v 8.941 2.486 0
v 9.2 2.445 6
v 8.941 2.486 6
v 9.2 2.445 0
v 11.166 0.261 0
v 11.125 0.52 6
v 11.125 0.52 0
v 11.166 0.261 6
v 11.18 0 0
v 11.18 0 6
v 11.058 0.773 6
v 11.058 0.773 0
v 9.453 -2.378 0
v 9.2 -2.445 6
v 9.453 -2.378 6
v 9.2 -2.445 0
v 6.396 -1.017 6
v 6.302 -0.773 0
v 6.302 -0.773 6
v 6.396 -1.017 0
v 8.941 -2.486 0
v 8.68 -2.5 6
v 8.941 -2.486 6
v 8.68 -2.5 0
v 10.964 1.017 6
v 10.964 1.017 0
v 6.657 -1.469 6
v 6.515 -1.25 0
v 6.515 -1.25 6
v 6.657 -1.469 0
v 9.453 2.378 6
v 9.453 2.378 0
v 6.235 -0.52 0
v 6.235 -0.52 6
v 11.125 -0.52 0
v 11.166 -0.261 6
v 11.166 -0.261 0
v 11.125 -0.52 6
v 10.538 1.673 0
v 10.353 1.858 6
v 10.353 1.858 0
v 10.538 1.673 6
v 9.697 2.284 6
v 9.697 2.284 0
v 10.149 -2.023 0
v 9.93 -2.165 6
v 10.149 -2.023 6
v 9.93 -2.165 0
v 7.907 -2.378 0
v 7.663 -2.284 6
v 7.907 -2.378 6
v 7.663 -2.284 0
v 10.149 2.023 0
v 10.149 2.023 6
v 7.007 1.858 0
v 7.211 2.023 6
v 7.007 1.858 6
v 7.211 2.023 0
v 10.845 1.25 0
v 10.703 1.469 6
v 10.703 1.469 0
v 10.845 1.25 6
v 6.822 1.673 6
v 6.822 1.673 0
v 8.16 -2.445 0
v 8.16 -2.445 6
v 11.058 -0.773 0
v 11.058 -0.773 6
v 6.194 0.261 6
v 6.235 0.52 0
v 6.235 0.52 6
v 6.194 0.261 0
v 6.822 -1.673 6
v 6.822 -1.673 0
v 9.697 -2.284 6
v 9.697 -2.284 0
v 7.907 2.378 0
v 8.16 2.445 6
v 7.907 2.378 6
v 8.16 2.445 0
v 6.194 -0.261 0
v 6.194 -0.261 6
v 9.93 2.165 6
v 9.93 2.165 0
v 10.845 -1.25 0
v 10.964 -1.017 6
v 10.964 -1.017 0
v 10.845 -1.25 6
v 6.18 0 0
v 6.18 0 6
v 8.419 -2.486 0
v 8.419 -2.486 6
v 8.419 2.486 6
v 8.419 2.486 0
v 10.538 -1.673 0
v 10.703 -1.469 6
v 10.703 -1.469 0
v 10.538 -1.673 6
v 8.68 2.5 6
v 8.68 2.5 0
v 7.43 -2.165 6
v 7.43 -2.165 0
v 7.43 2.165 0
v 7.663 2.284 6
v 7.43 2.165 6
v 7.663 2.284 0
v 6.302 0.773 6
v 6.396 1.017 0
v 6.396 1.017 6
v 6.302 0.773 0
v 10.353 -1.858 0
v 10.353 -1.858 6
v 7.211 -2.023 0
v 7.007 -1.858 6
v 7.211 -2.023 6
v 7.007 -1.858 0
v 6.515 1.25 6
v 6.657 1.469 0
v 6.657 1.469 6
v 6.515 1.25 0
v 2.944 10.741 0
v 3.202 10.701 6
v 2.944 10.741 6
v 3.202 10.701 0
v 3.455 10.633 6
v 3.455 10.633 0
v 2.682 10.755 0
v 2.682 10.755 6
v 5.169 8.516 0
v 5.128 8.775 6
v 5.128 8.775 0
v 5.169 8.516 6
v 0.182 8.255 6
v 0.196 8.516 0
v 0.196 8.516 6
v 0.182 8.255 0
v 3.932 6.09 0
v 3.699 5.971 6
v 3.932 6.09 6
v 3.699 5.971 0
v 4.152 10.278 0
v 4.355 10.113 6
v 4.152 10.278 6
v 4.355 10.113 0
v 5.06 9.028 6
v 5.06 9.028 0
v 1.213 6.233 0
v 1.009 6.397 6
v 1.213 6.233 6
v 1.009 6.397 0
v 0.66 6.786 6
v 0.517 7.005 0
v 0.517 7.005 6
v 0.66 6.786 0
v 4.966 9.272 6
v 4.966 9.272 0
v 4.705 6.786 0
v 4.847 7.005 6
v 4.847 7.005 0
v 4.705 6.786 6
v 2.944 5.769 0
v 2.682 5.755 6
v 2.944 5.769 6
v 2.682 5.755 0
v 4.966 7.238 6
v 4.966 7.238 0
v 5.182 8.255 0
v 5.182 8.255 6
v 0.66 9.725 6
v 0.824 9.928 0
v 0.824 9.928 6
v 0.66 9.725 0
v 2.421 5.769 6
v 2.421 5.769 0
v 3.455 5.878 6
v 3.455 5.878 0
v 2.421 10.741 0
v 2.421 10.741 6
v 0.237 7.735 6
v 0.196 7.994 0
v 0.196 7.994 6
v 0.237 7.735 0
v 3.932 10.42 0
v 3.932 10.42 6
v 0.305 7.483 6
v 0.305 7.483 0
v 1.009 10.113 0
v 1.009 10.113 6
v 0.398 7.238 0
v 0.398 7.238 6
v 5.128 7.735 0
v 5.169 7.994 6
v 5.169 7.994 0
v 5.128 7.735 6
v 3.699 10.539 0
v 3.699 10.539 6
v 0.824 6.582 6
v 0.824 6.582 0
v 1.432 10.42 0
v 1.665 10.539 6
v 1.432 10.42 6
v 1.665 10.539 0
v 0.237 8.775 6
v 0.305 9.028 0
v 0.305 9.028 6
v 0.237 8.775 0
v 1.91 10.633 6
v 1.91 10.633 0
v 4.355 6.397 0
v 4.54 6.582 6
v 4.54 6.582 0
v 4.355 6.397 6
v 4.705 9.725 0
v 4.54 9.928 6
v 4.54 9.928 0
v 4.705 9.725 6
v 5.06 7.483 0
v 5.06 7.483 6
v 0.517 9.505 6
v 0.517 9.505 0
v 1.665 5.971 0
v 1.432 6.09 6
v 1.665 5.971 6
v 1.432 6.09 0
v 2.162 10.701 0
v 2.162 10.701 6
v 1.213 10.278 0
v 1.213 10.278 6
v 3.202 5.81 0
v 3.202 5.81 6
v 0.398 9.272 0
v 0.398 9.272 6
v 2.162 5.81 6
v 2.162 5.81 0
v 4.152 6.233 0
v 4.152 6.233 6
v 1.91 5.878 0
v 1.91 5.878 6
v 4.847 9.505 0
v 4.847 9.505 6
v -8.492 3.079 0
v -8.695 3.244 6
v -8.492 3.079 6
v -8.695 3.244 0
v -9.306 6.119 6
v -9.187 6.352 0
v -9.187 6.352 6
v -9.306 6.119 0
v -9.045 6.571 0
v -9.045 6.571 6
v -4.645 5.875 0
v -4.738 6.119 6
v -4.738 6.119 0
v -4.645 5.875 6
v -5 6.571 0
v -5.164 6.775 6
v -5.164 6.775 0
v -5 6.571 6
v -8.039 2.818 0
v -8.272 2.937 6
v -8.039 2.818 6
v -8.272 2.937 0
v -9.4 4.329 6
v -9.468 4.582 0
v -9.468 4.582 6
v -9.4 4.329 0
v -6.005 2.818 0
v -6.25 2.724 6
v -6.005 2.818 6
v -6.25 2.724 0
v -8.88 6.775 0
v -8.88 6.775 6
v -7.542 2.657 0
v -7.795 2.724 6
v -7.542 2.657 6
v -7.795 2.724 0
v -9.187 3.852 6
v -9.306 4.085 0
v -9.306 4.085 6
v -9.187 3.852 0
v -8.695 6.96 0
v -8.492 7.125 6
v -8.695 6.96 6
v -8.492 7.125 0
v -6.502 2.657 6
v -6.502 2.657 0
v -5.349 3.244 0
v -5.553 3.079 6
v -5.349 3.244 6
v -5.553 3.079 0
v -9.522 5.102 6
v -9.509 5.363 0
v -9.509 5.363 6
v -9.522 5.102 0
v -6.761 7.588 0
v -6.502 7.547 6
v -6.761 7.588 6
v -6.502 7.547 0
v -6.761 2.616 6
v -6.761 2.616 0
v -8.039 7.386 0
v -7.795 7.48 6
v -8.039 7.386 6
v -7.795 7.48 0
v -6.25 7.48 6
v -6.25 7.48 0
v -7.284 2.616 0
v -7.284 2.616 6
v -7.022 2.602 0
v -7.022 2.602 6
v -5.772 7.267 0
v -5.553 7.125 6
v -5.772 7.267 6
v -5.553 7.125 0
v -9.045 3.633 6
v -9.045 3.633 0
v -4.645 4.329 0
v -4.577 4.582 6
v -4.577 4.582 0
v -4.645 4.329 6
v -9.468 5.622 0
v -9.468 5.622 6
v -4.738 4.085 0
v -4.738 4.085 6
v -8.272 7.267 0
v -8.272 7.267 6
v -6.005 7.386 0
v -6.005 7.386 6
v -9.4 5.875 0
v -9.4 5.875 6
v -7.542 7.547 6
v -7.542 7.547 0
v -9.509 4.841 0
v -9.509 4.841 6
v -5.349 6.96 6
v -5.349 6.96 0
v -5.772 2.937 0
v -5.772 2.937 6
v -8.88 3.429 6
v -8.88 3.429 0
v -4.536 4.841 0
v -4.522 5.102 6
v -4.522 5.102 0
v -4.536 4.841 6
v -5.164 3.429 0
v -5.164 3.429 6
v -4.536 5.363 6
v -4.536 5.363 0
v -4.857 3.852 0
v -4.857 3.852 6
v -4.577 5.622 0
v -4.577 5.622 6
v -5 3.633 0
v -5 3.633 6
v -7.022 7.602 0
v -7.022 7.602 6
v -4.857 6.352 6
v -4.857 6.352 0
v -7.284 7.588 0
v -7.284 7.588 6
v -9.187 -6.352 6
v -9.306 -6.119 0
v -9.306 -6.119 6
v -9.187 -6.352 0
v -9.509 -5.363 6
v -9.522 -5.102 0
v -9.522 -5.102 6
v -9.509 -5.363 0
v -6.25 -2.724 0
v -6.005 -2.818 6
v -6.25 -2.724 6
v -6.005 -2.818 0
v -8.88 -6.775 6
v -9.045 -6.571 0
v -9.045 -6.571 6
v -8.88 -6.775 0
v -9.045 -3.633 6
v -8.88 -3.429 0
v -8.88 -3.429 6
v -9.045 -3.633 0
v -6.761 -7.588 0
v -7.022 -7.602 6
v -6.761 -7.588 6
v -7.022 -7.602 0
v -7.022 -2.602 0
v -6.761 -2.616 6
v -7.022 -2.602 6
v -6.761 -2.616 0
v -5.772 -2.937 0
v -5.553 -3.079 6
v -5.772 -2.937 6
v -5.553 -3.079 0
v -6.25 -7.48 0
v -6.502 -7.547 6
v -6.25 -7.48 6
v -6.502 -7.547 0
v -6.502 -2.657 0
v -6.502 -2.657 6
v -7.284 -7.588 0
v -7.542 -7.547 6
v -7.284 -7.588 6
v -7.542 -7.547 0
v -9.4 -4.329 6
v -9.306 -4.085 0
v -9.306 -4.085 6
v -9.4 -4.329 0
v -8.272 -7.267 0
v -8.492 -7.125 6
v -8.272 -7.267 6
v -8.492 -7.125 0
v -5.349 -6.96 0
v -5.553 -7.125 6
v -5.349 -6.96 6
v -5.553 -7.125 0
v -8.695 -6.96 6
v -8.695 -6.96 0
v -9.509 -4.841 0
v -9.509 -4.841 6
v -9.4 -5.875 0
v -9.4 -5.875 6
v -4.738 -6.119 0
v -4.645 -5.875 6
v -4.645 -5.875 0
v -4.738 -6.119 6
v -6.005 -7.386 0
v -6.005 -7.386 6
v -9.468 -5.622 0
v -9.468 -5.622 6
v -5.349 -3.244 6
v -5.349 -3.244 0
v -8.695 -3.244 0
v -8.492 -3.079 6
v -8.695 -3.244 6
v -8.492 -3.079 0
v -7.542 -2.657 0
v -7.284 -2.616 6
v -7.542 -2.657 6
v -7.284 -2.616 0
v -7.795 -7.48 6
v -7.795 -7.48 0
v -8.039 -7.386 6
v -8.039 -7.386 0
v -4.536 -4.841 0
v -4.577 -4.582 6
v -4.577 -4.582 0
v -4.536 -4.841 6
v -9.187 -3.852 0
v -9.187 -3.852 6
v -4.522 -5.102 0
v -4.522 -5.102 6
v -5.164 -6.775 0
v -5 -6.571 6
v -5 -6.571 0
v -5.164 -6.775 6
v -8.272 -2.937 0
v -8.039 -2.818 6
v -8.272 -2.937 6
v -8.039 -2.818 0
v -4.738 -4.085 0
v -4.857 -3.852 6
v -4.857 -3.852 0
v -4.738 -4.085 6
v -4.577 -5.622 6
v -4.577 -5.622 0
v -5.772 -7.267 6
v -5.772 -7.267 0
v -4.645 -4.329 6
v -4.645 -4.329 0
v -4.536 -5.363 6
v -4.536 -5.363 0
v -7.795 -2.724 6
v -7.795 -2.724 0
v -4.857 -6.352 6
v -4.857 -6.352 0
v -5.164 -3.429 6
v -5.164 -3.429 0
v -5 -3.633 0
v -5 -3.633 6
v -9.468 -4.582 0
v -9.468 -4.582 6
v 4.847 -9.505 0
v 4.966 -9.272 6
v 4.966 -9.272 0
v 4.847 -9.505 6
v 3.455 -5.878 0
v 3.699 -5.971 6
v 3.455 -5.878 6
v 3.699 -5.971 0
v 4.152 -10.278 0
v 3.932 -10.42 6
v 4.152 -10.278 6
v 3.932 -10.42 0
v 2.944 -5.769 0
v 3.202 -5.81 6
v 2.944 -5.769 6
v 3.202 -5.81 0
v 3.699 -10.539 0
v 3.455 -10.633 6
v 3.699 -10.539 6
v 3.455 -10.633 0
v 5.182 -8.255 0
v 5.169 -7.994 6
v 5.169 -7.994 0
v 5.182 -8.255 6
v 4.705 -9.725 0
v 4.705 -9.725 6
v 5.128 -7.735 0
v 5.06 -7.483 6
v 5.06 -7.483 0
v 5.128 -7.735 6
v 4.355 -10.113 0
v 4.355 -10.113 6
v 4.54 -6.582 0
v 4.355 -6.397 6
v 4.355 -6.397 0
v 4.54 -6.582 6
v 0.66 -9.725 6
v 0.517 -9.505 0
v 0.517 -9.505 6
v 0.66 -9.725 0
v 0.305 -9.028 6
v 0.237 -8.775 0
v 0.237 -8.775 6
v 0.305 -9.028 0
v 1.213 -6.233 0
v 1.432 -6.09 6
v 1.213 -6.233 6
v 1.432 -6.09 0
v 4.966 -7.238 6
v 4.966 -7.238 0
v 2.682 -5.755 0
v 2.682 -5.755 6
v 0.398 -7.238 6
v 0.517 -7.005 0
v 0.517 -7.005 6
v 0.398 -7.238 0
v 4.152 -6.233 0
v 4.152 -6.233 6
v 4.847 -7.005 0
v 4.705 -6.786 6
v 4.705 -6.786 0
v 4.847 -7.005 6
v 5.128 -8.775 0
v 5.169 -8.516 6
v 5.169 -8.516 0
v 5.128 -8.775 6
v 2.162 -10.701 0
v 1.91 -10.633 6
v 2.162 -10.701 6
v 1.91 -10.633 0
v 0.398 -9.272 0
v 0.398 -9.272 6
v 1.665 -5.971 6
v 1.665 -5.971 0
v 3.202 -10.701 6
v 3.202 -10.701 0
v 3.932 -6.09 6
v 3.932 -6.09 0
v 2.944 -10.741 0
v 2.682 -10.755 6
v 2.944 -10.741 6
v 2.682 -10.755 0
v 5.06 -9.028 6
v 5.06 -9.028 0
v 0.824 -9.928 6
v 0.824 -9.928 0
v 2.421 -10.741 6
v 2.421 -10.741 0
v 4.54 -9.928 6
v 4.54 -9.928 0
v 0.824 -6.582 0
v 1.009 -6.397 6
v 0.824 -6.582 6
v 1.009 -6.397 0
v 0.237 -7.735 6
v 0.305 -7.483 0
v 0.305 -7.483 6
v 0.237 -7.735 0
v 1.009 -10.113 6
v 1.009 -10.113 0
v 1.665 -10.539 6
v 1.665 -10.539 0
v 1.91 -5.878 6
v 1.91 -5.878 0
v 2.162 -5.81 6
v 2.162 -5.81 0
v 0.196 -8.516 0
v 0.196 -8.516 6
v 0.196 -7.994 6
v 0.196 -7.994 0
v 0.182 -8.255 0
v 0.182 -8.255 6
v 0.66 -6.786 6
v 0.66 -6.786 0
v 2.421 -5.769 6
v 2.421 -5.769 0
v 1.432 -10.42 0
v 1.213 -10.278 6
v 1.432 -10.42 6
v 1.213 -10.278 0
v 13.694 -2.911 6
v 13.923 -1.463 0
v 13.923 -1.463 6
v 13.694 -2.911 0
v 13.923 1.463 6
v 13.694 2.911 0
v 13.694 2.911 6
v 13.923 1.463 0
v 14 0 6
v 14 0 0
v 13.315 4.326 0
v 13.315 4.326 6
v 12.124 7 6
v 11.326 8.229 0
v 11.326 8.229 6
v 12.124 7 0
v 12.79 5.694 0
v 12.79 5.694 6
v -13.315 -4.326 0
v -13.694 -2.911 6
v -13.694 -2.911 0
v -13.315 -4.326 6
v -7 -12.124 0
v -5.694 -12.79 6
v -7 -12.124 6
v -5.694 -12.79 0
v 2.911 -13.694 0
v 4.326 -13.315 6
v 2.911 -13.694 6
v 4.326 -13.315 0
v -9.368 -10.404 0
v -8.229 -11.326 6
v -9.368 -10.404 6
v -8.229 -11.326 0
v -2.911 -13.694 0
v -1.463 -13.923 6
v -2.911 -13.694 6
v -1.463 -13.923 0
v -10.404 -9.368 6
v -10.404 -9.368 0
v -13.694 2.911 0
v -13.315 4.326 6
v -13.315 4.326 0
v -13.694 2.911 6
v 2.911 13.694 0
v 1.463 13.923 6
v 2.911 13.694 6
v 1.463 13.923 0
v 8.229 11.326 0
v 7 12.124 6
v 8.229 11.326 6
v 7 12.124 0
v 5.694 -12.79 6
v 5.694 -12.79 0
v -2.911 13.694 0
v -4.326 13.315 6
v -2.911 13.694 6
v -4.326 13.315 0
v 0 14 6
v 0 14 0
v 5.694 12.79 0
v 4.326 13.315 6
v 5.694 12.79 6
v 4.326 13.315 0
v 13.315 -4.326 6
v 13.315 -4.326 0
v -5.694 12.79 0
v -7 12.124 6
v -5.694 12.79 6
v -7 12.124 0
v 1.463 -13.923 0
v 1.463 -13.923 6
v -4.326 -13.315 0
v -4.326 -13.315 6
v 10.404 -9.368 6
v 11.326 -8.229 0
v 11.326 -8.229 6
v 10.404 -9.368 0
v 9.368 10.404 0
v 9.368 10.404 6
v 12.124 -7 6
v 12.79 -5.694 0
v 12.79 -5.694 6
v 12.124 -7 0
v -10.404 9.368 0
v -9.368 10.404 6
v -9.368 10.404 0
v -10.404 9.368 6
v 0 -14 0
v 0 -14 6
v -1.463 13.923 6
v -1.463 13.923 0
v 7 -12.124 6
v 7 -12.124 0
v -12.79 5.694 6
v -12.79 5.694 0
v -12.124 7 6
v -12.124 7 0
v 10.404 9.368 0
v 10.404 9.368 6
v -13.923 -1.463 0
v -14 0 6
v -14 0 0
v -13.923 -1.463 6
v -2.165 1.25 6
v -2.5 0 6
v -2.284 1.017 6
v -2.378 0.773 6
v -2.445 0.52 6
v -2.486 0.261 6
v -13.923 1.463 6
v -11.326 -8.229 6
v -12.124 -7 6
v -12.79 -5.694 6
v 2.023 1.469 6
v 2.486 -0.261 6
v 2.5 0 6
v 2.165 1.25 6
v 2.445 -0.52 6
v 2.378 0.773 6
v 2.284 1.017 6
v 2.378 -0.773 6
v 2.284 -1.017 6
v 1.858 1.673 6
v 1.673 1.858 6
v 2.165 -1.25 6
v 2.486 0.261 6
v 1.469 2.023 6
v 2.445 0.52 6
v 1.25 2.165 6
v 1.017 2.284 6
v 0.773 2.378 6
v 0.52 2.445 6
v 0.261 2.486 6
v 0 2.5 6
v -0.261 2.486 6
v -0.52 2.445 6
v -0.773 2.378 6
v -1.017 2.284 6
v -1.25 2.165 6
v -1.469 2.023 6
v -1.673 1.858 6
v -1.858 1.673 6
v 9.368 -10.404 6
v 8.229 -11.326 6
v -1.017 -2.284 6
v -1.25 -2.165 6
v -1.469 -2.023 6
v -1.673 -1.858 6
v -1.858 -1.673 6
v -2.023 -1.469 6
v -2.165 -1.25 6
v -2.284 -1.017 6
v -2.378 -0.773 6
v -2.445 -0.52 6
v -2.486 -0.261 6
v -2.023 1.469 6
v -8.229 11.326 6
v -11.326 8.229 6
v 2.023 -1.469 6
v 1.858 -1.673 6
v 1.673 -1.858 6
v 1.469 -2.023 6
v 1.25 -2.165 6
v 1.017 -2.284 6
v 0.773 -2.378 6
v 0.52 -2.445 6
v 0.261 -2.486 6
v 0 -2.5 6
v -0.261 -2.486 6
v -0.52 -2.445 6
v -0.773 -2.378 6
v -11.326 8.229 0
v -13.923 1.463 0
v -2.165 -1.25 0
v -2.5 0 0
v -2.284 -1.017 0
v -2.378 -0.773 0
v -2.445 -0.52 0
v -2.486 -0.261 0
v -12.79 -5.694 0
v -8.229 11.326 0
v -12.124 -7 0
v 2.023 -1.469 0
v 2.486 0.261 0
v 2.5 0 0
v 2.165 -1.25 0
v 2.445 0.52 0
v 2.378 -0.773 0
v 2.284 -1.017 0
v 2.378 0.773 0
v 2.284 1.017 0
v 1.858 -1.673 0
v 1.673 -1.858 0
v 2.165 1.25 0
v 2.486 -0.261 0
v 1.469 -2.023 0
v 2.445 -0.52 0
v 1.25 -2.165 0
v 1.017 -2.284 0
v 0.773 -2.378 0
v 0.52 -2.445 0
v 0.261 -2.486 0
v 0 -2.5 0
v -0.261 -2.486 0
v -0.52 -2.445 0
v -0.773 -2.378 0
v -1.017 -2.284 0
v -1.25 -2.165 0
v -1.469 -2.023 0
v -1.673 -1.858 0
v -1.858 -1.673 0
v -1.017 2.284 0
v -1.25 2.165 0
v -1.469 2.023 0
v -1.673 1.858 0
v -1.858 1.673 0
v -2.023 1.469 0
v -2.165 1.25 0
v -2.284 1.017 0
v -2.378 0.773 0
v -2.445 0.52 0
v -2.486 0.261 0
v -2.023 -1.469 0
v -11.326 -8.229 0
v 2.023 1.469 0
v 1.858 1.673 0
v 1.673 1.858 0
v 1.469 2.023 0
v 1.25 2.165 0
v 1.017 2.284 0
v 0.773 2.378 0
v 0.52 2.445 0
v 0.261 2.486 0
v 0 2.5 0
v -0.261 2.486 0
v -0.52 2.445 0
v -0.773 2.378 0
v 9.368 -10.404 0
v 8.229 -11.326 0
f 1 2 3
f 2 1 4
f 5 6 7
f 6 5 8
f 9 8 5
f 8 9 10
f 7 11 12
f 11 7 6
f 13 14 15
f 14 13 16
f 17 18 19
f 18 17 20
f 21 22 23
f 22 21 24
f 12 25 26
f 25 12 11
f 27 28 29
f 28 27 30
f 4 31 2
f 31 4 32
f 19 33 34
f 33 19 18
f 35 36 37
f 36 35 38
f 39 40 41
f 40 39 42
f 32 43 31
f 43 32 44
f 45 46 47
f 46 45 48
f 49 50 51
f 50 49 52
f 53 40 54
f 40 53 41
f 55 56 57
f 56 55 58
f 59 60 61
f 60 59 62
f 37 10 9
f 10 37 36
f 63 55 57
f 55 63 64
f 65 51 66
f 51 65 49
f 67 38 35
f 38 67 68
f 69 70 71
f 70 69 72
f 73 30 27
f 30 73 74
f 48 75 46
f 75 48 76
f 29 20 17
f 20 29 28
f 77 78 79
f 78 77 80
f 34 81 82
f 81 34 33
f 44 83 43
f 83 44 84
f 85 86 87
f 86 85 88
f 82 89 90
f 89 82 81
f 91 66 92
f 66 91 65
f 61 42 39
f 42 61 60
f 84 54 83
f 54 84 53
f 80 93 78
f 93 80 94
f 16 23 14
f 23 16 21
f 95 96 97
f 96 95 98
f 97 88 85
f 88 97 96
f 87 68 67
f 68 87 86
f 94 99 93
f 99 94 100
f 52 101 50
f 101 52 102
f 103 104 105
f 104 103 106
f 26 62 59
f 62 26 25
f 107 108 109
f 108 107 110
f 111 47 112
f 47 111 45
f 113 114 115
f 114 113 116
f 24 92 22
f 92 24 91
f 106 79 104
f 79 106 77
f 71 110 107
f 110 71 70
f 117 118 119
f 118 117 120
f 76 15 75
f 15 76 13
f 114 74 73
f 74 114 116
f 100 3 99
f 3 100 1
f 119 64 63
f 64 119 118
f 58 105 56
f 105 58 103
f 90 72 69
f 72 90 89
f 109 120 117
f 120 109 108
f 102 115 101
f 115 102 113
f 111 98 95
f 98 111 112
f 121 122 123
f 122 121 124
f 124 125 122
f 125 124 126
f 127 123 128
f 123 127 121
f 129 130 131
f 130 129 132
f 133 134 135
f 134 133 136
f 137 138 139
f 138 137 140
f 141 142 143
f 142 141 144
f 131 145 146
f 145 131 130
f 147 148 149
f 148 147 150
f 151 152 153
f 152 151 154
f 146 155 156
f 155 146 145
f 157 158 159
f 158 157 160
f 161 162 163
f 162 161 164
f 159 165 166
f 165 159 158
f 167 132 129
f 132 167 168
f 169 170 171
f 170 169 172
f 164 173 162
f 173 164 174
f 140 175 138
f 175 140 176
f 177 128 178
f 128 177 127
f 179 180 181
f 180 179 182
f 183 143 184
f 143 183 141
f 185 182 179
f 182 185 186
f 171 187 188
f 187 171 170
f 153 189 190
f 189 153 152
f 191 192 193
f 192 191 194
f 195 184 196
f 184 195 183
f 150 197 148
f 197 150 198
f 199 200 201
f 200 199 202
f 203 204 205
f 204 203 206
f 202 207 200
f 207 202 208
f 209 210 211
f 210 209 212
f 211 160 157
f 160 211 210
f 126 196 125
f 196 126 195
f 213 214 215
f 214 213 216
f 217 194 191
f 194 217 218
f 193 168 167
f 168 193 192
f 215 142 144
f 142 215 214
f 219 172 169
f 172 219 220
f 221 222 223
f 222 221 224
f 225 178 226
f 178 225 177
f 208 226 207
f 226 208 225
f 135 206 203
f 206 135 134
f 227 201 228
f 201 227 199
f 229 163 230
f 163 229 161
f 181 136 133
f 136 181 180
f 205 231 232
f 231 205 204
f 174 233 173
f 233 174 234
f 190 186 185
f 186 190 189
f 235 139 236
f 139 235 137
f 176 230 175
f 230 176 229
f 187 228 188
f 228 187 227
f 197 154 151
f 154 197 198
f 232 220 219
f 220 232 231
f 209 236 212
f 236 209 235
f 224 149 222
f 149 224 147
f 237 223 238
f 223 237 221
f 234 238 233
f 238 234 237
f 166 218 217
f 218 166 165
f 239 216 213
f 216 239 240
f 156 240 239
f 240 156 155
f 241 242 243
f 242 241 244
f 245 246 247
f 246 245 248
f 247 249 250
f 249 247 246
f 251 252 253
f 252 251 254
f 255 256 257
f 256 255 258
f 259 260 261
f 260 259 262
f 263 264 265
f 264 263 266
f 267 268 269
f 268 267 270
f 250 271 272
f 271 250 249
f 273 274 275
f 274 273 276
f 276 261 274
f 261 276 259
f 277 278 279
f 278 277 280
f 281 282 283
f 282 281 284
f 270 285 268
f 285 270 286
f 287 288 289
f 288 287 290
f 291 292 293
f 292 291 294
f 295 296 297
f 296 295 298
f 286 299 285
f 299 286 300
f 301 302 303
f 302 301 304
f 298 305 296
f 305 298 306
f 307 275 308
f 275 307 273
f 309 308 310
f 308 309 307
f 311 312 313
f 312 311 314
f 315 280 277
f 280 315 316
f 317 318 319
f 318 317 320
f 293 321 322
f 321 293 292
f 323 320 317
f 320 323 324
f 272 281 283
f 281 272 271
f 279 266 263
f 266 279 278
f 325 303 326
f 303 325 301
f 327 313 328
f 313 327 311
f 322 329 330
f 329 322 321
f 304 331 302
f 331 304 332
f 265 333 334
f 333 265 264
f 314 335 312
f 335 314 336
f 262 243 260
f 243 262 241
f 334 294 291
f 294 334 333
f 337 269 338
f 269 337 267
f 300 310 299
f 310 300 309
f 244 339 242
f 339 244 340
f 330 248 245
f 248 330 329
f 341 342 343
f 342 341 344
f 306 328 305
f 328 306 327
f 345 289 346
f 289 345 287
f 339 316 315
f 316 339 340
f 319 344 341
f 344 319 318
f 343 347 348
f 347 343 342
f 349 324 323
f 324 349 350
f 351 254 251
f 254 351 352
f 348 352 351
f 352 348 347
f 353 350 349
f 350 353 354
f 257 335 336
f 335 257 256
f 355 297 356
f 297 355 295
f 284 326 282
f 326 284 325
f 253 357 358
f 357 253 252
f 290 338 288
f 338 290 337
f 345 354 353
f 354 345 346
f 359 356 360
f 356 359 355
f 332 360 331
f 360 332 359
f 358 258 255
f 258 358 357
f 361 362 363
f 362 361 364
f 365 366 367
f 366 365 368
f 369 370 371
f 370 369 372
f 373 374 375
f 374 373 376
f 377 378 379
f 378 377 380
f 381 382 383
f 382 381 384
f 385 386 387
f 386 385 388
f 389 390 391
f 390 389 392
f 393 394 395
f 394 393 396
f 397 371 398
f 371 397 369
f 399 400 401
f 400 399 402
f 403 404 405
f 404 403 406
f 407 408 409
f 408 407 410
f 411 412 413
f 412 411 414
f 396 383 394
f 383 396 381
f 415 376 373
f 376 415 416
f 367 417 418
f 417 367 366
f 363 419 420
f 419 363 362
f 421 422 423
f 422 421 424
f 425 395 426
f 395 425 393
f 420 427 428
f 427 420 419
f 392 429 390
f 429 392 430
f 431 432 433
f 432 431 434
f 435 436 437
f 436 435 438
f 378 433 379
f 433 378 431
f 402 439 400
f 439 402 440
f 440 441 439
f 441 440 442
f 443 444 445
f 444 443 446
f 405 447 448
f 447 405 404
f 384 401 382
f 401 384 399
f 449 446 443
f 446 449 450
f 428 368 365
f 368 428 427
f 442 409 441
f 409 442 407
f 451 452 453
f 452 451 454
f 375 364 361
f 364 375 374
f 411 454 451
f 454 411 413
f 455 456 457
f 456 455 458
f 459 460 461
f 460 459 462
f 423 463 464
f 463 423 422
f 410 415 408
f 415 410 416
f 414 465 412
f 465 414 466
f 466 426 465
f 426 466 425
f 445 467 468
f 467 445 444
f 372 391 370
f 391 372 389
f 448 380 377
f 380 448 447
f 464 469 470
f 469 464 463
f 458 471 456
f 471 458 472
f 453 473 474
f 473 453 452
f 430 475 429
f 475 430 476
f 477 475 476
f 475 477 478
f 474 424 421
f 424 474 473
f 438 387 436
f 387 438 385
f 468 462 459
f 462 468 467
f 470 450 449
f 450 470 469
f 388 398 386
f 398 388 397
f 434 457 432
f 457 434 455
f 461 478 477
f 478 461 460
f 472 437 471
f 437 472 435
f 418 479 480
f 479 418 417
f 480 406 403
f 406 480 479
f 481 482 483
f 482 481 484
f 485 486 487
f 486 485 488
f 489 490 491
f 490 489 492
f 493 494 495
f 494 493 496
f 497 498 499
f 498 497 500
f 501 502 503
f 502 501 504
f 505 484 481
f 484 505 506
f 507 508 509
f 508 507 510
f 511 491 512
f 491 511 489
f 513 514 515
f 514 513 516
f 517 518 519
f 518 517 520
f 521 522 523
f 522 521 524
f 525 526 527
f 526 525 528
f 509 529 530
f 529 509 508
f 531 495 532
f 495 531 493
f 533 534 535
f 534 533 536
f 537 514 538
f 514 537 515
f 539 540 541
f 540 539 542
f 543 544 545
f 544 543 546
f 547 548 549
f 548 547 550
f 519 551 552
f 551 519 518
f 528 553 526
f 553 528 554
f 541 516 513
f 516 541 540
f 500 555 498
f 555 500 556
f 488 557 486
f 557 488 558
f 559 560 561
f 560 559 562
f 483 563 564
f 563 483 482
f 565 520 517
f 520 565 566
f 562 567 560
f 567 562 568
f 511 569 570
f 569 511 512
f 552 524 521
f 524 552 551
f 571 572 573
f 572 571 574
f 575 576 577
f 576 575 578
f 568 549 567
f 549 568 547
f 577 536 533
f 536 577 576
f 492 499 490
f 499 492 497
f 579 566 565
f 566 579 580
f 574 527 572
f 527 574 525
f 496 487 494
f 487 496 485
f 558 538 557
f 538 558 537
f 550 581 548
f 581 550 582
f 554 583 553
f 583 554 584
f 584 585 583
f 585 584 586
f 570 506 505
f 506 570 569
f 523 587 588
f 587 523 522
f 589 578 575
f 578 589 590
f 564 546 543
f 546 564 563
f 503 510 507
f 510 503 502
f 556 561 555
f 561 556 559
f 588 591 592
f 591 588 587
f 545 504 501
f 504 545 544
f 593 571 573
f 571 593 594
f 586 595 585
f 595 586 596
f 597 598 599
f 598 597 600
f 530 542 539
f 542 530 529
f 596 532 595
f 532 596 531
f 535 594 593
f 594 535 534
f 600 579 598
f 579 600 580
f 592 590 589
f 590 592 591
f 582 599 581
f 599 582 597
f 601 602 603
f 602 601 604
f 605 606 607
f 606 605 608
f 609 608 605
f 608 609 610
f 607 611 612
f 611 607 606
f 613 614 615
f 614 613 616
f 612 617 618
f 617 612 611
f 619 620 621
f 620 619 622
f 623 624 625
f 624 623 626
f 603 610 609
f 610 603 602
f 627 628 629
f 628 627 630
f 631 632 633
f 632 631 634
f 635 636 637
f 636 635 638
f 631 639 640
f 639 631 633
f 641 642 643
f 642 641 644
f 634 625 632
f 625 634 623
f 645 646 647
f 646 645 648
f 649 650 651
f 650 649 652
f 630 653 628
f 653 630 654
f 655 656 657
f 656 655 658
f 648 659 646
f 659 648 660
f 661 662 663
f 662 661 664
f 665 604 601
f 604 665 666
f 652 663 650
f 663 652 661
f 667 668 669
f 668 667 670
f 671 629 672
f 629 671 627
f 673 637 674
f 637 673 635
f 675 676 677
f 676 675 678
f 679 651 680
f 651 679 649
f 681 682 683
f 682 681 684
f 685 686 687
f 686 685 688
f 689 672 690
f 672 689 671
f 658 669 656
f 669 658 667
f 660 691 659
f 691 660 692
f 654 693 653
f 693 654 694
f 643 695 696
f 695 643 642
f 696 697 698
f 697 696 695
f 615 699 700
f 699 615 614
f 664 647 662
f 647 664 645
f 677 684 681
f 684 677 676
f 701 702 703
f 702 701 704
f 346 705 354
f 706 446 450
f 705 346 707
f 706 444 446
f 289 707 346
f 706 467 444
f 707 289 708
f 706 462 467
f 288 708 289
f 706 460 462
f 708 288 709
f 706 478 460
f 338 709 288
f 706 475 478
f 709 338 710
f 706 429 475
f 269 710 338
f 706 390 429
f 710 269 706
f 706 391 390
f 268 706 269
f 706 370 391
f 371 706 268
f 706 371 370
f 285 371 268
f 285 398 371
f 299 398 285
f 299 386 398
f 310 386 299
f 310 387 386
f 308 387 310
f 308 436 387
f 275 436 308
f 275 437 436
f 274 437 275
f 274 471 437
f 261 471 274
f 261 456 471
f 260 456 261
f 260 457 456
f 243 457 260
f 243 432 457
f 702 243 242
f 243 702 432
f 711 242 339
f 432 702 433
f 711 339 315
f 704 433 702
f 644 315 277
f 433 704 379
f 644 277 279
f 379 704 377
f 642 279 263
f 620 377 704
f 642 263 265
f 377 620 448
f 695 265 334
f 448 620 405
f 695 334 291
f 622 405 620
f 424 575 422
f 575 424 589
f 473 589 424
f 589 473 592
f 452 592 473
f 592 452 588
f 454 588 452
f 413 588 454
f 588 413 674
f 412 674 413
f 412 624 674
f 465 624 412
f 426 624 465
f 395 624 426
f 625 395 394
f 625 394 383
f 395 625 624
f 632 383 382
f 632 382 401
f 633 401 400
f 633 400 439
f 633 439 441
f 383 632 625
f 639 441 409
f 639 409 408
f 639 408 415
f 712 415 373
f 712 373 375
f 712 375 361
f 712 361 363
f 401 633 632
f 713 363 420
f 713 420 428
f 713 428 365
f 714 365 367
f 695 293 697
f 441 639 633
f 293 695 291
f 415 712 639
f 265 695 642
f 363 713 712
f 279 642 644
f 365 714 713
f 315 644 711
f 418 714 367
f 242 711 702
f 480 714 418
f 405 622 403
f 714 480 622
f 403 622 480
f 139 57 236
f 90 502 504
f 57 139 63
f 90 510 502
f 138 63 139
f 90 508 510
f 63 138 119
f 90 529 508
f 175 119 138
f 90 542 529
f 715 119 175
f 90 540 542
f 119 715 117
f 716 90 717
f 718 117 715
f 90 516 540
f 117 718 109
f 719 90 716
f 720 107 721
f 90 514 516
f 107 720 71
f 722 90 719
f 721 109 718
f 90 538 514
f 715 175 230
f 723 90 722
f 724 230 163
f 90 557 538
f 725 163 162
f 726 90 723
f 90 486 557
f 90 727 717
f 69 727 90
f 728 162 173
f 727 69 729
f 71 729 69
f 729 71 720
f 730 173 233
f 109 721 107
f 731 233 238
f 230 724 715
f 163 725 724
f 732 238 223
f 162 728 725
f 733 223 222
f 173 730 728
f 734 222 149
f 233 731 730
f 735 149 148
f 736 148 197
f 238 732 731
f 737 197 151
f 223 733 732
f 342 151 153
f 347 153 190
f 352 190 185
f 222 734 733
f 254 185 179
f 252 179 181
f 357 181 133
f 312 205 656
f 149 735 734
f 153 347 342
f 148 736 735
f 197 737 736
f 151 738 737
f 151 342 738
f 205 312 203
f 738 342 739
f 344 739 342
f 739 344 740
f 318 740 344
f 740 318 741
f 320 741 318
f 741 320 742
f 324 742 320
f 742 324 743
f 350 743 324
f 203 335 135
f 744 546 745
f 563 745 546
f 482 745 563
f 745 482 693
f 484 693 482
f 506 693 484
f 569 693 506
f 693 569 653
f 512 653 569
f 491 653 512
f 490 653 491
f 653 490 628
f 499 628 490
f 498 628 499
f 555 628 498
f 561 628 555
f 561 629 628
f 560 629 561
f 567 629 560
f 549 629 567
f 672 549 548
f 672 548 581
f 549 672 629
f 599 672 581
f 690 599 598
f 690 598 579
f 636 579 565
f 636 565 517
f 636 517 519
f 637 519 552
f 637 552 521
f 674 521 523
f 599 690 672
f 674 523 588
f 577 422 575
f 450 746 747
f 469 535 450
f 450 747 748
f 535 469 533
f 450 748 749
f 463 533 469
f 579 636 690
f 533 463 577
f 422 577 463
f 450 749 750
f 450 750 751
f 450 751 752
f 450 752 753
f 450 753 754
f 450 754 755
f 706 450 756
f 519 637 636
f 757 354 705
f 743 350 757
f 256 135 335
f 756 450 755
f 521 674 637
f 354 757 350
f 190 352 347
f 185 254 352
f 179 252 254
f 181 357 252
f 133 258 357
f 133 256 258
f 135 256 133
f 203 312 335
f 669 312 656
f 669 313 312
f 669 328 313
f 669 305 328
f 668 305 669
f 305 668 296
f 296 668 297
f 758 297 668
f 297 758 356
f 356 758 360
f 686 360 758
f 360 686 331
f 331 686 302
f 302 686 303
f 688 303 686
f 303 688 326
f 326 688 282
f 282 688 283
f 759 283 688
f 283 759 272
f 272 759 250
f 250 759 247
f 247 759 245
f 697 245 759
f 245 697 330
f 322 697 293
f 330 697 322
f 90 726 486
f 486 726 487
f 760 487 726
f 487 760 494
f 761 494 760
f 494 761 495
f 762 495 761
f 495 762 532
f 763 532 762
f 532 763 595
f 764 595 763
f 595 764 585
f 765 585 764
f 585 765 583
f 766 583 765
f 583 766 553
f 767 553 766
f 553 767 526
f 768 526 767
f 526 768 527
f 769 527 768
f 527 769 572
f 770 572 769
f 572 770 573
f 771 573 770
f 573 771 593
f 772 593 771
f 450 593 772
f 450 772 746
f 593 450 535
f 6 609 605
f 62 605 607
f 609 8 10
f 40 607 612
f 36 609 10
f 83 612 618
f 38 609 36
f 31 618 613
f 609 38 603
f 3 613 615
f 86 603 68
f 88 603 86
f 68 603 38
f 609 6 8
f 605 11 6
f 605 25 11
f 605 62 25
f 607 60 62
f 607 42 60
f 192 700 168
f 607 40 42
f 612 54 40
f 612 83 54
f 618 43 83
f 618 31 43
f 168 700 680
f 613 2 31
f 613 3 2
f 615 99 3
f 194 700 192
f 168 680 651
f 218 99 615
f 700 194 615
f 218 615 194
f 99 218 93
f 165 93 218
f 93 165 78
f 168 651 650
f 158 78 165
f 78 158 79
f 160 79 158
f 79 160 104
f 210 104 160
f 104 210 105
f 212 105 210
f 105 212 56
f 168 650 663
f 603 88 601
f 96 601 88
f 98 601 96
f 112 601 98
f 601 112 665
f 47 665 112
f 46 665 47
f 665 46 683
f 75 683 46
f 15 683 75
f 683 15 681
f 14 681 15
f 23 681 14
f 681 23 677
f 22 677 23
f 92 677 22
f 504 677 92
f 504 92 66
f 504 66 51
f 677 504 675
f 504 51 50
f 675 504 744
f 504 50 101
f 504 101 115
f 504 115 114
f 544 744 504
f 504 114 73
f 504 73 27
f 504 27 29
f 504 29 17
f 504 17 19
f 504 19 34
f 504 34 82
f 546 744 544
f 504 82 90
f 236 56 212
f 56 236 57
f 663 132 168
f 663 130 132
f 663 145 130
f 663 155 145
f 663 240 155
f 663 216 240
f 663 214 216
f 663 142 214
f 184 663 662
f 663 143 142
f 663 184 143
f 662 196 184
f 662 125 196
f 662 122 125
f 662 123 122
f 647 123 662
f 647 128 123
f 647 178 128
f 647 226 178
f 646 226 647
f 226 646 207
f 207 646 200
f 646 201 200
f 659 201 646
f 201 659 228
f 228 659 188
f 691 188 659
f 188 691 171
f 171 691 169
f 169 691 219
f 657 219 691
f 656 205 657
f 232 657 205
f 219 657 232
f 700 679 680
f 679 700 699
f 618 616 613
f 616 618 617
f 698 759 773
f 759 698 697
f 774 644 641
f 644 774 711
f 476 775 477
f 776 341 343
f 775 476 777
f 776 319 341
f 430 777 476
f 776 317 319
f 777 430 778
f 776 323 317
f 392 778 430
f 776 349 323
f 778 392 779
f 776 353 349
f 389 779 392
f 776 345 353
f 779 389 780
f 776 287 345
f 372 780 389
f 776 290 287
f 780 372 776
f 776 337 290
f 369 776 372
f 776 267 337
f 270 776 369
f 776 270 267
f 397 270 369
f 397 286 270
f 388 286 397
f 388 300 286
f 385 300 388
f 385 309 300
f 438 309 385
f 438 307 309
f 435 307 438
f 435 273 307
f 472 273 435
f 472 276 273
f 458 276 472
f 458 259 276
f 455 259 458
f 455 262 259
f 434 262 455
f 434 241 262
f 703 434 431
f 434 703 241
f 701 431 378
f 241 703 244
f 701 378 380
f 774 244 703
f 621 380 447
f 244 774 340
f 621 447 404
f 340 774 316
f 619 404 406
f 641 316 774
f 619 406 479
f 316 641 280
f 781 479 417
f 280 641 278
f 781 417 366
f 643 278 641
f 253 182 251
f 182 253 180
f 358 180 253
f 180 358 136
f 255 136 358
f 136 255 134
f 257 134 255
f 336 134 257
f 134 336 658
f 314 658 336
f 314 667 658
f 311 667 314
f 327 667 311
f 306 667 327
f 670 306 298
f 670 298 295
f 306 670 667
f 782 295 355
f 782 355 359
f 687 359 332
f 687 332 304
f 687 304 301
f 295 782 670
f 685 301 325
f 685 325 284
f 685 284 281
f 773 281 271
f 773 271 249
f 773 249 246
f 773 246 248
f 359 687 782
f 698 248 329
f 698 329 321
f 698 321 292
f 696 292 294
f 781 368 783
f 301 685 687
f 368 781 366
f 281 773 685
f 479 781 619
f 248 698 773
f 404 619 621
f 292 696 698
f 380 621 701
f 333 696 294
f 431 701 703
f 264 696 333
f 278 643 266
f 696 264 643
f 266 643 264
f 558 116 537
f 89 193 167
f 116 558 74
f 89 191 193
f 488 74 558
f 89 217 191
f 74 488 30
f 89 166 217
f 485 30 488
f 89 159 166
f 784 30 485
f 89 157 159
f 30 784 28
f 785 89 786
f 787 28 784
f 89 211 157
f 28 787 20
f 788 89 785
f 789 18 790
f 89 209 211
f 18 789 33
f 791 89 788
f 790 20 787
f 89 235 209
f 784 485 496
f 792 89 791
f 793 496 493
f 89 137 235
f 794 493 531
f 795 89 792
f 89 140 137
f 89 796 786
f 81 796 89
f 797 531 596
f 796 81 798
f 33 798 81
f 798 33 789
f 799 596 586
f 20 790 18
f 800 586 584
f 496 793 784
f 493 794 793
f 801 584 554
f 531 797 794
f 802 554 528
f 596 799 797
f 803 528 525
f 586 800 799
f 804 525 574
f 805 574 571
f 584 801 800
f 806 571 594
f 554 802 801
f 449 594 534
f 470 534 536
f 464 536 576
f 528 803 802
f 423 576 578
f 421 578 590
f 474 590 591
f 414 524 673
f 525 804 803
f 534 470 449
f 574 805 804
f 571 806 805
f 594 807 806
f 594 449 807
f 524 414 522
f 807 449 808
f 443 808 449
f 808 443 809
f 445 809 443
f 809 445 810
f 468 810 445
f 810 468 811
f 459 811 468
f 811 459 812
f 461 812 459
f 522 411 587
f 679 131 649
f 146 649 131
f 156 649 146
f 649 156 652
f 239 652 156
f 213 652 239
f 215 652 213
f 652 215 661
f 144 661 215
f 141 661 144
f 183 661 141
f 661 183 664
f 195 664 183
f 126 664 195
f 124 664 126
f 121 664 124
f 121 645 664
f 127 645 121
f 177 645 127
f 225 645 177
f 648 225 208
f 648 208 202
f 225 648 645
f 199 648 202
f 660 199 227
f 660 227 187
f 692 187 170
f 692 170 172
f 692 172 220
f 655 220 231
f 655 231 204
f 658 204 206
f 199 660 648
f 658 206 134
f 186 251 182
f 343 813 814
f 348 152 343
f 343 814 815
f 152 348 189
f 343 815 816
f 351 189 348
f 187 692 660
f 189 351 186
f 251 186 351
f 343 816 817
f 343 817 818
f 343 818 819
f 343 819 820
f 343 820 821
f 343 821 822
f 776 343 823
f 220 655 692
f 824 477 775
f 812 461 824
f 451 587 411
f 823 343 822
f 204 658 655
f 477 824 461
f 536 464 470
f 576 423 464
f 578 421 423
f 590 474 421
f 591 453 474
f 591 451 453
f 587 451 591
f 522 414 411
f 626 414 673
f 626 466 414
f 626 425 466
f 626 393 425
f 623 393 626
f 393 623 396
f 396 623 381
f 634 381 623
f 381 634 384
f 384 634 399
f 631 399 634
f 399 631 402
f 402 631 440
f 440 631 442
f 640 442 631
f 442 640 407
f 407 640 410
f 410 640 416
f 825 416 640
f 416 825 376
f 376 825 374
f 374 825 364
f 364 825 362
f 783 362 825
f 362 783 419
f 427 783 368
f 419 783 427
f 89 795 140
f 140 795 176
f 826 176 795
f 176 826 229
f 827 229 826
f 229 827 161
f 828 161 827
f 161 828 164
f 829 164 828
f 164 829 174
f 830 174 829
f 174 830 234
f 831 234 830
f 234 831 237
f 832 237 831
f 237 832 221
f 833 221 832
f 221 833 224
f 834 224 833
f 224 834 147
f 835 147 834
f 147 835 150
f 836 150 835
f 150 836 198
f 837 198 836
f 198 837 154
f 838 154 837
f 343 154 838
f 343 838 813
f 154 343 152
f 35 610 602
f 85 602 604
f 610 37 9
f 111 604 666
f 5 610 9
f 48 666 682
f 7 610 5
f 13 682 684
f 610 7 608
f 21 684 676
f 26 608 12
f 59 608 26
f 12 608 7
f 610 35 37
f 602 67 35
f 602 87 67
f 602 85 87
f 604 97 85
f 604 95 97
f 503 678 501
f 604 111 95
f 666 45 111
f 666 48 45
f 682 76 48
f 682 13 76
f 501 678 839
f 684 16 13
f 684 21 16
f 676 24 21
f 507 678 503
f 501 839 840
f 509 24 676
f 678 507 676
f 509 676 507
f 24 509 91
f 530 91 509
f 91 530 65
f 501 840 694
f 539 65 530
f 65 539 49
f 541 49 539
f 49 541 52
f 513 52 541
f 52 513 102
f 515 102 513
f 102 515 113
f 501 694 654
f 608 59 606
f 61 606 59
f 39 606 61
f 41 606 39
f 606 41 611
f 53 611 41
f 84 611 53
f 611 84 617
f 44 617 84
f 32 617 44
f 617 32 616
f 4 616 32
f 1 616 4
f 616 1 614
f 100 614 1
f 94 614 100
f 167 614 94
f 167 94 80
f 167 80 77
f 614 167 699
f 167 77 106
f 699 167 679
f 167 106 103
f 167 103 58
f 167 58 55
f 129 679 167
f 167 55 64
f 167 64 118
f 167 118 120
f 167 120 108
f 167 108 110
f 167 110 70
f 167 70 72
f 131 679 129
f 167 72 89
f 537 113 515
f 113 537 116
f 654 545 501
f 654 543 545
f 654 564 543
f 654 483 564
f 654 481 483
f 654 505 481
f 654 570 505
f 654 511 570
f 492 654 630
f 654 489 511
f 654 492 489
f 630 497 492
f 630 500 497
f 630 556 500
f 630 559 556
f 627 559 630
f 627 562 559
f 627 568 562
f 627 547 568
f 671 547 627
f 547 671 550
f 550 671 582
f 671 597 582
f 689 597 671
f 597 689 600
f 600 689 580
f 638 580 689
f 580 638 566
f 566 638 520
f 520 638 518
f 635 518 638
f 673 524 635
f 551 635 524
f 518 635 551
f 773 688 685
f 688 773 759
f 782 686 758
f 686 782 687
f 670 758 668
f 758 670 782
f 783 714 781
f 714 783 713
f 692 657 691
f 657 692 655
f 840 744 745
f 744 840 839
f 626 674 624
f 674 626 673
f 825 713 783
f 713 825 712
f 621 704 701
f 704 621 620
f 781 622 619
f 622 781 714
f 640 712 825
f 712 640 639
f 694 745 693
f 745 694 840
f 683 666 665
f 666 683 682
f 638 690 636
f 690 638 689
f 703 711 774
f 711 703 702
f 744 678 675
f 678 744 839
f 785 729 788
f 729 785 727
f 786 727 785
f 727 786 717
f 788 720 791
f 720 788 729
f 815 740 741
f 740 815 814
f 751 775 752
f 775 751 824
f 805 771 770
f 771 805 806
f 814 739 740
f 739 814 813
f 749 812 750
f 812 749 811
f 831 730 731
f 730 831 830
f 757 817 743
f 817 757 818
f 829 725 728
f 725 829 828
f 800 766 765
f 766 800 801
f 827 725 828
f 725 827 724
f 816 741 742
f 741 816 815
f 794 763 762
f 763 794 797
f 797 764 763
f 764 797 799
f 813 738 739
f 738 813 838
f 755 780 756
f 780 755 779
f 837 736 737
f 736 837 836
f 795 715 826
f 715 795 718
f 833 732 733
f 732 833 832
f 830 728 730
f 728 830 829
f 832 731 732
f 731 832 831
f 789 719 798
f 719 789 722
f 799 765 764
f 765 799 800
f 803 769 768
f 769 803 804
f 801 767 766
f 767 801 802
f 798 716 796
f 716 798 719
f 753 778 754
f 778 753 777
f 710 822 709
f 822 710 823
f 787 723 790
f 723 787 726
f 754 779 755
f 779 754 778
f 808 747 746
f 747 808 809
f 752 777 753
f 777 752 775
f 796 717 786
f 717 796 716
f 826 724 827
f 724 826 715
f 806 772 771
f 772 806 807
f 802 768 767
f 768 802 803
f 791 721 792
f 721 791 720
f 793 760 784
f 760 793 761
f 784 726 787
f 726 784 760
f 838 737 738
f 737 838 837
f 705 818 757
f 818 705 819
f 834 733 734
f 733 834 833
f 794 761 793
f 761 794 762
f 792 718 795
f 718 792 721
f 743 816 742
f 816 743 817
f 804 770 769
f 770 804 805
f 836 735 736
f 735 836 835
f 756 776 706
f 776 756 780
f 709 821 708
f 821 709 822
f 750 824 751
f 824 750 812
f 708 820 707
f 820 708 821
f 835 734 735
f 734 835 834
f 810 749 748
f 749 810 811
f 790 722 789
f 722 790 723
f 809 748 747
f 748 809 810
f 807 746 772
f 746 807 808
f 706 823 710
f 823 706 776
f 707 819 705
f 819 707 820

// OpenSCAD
// Lightweight sprocket blank.
$fn = 60;
eps = 0.02;
bore_d = 5;
outer_d = 28;
spoke_holes = 5;
thickness = 6;
difference() { cylinder(d=outer_d,h=thickness); translate([0,0,-eps]) cylinder(d=bore_d,h=thickness+2*eps); for(i=[0:spoke_holes-1]) rotate([0,0,i*360/spoke_holes]) translate([outer_d*0.31,0,-eps]) cylinder(d=5,h=thickness+2*eps); }
